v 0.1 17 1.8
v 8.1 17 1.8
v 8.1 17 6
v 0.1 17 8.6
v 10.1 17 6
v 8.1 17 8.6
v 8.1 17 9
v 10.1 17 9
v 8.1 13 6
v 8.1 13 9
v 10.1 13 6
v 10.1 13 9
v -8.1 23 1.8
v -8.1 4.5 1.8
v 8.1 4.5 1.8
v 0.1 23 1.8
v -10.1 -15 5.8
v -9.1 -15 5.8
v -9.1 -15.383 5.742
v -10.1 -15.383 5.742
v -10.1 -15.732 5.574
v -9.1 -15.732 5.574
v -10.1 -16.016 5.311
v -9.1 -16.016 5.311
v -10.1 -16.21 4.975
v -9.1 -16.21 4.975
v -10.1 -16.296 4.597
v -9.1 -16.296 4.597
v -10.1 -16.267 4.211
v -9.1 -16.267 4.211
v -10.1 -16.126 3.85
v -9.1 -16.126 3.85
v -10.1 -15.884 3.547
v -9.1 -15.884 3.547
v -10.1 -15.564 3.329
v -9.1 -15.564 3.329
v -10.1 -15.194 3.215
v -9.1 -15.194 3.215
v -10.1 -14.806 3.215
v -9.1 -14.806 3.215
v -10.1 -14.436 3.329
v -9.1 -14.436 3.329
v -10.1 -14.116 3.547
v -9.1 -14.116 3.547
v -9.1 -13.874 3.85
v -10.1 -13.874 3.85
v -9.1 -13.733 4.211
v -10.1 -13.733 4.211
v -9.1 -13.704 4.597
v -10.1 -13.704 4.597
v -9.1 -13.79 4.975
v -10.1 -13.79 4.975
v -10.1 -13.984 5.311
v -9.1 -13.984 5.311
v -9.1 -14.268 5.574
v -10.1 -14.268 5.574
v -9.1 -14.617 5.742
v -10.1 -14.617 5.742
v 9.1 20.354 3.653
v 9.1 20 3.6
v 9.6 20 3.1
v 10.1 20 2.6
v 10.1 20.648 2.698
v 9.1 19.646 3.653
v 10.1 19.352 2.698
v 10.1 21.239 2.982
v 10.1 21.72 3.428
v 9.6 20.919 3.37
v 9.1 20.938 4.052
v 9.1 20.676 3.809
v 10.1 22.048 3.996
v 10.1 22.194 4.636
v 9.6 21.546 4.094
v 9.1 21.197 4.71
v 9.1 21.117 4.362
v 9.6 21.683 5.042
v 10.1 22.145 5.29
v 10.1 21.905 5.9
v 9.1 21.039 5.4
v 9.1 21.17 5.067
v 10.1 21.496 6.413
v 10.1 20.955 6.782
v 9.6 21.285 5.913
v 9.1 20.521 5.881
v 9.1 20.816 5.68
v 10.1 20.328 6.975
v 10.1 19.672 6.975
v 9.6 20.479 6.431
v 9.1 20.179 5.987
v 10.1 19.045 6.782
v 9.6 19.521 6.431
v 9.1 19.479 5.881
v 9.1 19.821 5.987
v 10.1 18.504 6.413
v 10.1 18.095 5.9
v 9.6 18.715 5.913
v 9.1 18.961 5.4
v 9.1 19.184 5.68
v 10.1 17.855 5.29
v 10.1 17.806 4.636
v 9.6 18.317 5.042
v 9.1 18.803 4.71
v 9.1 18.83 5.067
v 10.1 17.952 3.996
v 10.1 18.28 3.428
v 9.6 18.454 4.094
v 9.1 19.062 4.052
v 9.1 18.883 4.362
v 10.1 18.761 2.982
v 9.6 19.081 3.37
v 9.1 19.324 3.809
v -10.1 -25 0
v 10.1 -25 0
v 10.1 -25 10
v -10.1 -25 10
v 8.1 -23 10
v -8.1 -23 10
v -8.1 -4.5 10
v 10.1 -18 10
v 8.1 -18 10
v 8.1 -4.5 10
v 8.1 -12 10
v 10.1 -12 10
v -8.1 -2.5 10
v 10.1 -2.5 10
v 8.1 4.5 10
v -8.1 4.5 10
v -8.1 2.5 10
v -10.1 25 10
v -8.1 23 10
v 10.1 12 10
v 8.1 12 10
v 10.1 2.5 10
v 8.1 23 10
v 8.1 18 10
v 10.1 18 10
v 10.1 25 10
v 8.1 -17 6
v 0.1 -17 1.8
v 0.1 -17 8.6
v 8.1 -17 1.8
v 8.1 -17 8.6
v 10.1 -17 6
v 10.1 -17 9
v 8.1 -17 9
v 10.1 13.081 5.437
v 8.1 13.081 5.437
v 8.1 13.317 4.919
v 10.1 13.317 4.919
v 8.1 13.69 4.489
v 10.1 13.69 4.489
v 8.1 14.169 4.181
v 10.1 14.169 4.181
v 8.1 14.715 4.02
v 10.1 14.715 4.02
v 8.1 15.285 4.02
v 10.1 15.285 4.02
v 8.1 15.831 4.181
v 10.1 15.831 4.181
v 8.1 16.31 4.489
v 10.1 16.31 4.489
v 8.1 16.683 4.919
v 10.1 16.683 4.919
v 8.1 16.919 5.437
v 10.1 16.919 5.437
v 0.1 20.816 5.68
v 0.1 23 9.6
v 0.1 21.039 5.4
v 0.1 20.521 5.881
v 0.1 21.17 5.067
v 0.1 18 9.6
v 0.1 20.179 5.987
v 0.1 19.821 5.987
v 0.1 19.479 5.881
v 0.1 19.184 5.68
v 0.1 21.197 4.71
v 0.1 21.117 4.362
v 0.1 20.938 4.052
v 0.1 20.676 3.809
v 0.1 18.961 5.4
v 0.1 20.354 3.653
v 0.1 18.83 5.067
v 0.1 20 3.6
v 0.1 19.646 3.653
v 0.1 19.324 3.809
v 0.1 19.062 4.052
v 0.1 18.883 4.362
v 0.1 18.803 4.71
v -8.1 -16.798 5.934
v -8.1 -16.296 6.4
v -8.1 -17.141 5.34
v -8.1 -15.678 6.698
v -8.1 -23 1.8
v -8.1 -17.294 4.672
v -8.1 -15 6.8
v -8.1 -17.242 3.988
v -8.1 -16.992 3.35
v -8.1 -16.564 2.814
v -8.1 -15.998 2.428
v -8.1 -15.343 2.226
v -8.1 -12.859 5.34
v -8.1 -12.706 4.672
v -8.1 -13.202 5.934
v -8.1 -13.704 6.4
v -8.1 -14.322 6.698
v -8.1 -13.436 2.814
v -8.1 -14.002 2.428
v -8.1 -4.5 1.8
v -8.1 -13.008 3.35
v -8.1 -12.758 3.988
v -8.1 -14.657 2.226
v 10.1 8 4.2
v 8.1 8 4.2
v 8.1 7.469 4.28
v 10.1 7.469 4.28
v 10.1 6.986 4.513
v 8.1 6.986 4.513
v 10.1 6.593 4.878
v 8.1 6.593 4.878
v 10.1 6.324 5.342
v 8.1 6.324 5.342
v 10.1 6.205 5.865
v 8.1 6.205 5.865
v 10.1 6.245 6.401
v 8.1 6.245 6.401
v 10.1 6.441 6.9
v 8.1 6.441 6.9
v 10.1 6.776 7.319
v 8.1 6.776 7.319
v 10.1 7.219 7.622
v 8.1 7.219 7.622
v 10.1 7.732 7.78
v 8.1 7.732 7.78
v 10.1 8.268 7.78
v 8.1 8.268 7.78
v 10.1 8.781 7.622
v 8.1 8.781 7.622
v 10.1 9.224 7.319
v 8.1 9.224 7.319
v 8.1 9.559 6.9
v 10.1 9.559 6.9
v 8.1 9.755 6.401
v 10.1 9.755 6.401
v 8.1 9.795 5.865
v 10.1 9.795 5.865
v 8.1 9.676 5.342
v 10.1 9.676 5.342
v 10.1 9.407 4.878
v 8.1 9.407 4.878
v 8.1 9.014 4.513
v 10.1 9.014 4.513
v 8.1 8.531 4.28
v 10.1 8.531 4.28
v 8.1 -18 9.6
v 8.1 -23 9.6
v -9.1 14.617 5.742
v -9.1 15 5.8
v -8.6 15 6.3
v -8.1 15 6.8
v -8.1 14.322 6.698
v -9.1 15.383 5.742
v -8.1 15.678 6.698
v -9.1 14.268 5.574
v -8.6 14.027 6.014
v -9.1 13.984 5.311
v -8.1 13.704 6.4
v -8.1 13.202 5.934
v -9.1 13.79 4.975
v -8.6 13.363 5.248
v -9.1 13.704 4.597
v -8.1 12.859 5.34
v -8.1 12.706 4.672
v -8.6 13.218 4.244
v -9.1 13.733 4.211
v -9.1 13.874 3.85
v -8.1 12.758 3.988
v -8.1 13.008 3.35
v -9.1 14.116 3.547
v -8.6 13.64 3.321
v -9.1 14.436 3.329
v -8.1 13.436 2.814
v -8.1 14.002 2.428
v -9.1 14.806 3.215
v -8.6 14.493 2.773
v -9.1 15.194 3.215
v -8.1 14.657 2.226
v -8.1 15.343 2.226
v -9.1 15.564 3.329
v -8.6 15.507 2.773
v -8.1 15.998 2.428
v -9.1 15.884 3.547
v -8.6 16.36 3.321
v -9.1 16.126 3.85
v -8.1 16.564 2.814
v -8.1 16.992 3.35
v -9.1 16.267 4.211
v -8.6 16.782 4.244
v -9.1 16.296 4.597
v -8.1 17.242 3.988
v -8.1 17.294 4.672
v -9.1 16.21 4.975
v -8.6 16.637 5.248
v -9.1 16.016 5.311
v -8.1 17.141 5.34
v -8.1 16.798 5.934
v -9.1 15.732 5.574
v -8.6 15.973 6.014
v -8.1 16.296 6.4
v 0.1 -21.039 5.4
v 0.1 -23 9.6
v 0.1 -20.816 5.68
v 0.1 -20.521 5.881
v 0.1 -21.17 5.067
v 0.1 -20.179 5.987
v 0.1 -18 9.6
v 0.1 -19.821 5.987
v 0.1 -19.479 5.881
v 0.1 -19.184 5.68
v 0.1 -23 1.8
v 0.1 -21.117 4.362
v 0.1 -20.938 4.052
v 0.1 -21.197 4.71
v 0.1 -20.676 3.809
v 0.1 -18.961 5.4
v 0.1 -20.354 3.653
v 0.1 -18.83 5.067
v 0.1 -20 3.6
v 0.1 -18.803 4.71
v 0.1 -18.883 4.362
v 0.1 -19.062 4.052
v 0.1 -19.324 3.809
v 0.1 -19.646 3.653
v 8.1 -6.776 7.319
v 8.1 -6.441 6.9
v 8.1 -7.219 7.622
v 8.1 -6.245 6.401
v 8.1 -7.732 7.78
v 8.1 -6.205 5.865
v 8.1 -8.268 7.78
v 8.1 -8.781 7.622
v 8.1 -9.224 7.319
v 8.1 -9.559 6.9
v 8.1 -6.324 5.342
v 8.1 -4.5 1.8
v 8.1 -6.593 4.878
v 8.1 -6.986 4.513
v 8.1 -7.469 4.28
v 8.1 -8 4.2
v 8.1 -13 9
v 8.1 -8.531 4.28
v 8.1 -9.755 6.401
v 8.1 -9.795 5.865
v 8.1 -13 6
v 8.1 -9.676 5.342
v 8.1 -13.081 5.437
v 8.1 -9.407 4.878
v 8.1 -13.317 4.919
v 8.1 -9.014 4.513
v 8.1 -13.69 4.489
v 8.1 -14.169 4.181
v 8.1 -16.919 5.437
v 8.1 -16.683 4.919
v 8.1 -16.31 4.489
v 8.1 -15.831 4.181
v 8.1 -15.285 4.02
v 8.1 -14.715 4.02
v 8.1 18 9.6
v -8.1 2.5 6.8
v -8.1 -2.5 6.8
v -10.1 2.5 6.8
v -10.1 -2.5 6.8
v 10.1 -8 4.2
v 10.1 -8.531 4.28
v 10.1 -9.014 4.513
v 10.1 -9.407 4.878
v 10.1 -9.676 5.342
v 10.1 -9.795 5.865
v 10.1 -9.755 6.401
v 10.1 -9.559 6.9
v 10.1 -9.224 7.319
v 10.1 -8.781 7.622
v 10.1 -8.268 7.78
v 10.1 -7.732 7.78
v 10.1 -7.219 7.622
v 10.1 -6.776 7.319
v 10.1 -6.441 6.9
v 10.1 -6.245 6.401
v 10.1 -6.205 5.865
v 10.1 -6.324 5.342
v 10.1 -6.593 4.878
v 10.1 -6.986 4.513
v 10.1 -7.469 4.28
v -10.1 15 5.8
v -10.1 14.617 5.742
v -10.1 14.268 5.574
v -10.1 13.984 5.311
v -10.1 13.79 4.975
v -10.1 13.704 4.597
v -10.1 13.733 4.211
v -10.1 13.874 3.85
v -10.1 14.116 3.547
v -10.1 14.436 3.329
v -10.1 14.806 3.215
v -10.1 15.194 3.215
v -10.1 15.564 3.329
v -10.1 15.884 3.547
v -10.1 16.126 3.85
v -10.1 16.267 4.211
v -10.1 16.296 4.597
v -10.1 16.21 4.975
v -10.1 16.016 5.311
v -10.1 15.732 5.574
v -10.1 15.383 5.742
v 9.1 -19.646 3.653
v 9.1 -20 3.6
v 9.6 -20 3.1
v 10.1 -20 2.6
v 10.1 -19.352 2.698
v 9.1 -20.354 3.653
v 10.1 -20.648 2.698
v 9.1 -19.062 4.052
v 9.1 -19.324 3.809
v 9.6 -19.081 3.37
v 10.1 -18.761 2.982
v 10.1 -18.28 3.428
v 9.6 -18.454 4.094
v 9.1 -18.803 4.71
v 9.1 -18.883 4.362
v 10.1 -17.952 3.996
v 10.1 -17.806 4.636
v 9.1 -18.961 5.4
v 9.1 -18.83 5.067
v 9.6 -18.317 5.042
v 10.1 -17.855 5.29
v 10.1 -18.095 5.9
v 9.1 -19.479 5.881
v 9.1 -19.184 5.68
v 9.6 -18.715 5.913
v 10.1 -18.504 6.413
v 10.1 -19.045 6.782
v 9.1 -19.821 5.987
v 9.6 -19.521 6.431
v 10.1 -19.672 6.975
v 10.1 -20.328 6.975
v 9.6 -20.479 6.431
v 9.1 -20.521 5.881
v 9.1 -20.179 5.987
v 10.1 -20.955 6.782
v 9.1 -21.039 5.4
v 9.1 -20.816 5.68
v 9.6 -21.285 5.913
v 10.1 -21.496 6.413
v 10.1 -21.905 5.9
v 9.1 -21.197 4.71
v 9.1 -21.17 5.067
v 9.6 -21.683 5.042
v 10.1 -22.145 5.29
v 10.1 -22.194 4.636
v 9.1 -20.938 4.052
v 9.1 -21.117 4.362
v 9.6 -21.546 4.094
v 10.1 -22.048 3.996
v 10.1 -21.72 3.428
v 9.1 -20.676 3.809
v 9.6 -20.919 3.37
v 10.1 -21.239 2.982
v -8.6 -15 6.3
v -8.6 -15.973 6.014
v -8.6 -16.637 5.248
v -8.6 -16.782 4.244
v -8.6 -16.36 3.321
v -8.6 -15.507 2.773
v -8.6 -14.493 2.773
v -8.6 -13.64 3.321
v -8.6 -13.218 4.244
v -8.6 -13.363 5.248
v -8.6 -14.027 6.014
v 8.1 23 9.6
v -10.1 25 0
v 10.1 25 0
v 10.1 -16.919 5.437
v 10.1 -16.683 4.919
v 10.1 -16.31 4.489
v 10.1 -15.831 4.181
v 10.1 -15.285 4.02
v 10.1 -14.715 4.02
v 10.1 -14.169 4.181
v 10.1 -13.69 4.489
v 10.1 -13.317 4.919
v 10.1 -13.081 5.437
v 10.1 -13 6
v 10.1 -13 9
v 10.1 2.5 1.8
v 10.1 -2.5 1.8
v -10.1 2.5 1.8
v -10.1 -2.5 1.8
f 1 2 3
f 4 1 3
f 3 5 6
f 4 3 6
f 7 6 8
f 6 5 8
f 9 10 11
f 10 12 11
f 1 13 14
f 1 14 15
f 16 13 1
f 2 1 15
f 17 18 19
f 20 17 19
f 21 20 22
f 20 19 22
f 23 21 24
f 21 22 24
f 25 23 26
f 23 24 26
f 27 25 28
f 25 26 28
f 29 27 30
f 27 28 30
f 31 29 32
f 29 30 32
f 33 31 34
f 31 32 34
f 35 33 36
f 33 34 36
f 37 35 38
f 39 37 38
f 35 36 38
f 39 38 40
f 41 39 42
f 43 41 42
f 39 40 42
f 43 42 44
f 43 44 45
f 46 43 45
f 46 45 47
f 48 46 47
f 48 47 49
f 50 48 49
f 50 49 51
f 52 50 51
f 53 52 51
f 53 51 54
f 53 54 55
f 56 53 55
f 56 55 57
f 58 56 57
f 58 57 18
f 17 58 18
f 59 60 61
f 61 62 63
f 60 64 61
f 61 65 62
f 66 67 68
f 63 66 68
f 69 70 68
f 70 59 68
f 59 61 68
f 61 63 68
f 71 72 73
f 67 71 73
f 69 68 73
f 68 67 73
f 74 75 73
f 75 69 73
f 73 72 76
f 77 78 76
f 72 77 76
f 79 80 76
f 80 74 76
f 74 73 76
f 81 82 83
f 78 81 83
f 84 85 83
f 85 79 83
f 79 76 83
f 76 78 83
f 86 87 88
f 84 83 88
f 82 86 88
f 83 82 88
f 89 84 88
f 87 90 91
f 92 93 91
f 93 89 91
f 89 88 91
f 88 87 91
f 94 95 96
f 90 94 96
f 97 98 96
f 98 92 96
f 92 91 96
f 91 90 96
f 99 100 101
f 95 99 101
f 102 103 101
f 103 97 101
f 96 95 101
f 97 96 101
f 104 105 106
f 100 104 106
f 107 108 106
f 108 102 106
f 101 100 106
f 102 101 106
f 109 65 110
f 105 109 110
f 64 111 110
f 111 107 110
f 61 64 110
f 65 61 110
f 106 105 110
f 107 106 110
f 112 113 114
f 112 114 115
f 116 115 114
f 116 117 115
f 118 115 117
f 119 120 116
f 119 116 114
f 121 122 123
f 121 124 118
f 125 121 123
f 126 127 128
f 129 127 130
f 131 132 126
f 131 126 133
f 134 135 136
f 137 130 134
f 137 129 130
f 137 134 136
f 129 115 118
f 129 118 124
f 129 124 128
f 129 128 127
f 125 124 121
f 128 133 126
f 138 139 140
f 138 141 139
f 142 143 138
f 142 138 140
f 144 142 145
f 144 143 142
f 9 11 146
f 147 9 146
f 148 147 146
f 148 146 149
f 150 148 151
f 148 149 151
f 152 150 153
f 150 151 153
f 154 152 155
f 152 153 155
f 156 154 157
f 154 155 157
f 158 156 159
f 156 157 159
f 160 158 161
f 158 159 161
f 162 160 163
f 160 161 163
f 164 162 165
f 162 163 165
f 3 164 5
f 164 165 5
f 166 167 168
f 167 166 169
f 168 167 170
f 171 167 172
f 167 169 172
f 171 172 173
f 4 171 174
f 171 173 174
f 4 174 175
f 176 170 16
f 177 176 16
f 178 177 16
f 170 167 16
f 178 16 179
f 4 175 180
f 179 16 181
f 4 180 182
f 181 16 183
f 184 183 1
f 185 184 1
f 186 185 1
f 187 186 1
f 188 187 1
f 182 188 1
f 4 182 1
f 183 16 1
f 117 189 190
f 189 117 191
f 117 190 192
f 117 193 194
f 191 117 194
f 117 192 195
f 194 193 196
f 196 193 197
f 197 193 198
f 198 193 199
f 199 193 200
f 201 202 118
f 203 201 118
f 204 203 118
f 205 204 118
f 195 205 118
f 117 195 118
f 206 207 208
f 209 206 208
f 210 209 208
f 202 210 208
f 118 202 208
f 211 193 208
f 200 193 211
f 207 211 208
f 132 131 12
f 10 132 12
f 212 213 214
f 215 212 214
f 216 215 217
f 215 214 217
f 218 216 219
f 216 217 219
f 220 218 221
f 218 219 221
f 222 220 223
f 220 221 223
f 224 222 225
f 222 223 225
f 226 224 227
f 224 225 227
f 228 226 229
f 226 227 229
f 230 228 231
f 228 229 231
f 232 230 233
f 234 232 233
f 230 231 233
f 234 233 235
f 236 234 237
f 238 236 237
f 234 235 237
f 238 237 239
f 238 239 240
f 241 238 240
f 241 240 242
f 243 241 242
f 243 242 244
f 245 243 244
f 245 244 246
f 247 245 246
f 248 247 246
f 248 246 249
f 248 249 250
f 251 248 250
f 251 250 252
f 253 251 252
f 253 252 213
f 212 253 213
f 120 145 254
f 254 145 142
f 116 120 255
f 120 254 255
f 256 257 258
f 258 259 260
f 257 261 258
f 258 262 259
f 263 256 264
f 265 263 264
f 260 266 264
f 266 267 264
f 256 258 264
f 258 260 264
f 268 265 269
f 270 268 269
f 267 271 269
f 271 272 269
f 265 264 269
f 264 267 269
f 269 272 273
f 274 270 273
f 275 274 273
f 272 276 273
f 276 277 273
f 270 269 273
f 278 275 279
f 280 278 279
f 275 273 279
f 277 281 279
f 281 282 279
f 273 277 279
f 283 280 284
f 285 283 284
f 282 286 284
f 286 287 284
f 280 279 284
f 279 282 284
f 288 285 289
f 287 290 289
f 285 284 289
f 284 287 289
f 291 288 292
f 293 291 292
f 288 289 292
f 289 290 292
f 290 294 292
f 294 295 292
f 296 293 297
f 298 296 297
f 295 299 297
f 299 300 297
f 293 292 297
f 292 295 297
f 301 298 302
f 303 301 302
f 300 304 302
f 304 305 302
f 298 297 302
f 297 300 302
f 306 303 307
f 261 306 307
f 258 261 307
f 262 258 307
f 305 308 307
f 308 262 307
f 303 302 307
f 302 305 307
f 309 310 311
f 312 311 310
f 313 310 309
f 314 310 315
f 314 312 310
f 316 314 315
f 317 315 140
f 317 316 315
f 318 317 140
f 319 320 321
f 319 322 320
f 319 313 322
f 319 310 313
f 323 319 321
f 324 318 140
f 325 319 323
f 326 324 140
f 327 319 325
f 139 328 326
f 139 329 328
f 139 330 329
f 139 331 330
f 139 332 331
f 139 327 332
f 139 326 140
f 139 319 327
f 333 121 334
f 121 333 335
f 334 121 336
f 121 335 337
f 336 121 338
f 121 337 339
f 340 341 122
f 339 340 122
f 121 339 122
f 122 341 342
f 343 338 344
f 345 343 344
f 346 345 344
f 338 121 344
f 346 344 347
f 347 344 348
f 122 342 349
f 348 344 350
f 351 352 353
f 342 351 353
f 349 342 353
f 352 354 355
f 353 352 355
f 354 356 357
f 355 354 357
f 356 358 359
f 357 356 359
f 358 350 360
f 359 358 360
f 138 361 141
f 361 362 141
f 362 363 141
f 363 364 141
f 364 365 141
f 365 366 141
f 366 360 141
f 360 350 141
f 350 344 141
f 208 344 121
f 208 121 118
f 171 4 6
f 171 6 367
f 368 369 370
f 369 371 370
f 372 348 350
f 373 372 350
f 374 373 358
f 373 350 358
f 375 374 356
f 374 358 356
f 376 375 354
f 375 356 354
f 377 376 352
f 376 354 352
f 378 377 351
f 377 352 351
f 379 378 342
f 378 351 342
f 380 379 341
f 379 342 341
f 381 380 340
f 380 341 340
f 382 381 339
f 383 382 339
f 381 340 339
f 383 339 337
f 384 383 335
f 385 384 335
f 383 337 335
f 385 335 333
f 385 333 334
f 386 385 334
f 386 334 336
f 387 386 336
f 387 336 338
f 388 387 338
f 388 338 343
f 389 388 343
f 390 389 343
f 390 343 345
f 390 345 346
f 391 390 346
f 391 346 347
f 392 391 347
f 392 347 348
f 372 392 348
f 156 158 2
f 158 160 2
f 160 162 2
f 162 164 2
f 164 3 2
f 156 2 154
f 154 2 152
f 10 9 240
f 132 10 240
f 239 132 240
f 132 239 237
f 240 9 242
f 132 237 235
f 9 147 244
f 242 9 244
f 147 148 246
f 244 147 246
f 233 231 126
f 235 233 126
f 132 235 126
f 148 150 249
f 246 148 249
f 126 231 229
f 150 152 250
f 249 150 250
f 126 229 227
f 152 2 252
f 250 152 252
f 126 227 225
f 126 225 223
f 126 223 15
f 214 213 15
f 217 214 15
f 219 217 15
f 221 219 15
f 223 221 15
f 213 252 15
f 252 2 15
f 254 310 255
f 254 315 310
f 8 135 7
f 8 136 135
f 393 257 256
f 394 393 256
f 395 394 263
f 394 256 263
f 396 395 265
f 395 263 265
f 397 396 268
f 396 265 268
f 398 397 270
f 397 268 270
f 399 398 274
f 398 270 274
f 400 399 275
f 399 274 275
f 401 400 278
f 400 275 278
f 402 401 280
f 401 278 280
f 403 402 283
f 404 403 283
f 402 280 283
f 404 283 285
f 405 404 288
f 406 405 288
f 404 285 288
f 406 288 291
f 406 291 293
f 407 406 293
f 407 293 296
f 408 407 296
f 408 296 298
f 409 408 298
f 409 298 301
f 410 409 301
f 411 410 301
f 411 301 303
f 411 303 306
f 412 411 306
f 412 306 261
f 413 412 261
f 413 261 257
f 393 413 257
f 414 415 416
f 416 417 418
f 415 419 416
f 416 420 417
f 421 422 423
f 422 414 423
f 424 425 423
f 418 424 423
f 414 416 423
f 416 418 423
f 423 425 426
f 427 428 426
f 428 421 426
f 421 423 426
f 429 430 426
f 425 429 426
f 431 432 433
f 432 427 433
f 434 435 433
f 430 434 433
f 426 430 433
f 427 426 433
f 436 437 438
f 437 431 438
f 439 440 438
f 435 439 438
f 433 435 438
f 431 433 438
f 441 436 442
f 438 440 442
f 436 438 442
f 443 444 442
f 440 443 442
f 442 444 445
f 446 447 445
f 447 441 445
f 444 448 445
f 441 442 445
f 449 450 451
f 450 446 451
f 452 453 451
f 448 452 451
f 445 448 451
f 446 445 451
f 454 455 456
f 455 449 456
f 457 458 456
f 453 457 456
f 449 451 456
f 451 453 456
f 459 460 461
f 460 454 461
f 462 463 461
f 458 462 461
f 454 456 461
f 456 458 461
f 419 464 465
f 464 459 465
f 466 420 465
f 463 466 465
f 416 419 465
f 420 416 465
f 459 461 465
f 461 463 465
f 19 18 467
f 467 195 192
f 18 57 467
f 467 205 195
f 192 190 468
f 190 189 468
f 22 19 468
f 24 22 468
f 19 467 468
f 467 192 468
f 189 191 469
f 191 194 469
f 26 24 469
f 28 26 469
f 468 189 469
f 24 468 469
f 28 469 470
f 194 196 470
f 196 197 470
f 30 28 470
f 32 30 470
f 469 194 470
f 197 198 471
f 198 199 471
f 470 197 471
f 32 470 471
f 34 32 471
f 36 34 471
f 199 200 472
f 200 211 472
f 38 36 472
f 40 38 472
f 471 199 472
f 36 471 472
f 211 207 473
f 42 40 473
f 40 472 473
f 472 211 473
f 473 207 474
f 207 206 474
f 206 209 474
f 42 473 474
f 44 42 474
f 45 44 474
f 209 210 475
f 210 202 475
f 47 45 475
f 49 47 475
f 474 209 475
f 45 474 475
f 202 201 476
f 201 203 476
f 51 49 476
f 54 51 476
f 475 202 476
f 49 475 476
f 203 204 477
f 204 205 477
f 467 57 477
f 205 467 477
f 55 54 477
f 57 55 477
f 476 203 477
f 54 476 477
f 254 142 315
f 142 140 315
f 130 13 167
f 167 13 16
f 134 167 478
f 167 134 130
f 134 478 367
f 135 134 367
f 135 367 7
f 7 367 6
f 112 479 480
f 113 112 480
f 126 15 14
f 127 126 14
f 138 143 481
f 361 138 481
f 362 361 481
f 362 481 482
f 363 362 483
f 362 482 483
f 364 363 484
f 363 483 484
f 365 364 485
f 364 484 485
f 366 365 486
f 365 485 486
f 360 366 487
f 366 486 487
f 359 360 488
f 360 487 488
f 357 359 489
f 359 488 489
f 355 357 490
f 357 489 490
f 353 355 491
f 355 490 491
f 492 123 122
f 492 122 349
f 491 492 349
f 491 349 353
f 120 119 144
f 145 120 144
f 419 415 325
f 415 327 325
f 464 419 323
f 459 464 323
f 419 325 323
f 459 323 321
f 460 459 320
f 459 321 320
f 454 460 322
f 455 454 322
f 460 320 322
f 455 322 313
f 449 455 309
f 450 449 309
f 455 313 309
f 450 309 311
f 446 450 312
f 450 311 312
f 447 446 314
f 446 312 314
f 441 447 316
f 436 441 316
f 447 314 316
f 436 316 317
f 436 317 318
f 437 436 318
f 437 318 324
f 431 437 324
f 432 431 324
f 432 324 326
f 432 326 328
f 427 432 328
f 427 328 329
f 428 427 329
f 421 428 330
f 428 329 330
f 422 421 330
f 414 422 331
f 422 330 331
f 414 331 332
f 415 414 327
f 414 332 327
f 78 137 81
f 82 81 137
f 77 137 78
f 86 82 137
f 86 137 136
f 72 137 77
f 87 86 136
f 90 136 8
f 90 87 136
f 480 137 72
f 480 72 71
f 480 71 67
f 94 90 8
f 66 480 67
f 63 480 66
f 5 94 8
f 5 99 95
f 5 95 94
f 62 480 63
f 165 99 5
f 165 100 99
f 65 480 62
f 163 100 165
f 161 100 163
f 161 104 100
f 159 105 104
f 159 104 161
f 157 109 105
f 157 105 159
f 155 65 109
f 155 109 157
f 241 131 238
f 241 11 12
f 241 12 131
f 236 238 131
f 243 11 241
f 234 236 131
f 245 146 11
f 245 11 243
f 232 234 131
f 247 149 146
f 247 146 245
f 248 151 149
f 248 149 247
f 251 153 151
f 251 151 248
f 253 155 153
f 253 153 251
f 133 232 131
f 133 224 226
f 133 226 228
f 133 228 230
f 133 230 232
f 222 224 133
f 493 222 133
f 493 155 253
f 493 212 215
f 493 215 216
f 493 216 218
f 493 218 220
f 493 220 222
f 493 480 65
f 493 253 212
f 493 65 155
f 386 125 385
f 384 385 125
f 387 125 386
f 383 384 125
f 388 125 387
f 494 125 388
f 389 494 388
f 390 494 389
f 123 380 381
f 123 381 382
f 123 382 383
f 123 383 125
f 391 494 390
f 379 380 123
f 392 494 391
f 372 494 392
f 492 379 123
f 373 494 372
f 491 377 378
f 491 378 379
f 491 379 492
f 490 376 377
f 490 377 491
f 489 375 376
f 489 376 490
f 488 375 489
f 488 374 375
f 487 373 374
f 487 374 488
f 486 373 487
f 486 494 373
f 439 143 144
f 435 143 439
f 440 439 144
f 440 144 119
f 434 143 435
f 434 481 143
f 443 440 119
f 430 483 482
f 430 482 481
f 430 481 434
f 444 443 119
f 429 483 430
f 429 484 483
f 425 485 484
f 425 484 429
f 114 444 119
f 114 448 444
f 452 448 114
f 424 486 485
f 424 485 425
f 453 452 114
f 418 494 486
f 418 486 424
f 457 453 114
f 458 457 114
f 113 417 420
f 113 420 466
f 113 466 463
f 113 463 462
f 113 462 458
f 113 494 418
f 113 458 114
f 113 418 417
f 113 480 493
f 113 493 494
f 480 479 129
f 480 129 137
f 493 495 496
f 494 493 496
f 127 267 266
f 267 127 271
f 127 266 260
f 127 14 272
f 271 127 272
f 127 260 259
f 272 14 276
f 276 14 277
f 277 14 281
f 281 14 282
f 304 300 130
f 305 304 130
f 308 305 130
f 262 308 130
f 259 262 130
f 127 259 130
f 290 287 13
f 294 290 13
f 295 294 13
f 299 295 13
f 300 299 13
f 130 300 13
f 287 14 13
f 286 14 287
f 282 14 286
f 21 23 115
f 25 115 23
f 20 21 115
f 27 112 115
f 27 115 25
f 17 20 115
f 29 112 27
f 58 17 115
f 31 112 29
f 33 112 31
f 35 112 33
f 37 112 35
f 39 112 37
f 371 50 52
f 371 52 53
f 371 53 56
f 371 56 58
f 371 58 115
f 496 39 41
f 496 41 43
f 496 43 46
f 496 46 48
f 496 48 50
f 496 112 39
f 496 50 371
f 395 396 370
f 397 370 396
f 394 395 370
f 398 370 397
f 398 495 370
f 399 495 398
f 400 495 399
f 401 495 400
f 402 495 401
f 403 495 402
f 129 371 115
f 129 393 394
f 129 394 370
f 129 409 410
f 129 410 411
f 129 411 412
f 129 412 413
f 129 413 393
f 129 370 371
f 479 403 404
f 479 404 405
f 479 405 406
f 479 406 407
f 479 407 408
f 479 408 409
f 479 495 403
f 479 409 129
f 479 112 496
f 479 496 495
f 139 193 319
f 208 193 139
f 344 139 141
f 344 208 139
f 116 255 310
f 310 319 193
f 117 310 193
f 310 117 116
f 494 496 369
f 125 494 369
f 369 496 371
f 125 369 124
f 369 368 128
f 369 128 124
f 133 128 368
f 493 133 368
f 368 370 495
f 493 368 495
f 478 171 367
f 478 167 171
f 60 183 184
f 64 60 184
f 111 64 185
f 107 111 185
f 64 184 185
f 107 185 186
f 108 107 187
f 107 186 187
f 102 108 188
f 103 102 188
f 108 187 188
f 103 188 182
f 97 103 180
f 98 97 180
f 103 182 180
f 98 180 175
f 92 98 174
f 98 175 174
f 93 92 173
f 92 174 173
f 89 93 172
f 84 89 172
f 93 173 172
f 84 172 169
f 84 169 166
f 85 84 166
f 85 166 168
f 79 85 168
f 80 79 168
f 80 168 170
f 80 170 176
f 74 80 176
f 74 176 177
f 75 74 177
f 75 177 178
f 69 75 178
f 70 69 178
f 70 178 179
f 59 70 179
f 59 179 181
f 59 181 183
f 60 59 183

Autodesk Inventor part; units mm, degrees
ref_plane "YZ Plane" through (0, 0, 0) normal (1, 0, 0) x (0, 1, 0)
ref_plane "XZ Plane" through (0, 0, 0) normal (0, 1, 0) x (-1, 0, 0)
ref_plane "XY Plane" through (0, 0, 0) normal (0, 0, 1) x (1, 0, 0)
sketch "Sketch3" plane through (0, 0, 0) normal (0, 0, 1) x (1, 0, 0)
  line L0 (-10.1, 25) -> (10.1, 25)
  line L1 (10.1, 25) -> (10.1, -25)
  line L2 (10.1, -25) -> (-10.1, -25)
  line L3 (-10.1, -25) -> (-10.1, 25)
  point P0 (0, 0)
  dimension "d26" = 20.2
  dimension "d27" = 50
extrude "Extrusion3" add sketch "Sketch3" along normal blind 1.8
sketch "Sketch4" plane through (0, 0, 1.8) normal (0, 0, 1) x (1, 0, 0)
  line L0 (-8.1, 23) -> (8.1, 23)
  line L1 (8.1, -23) -> (-8.1, -23)
  line L2 (-8.1, 0) -> (-8.1, 2.5)
  line L3 (-8.1, 2.5) -> (8.1, 2.5)
  line L4 (8.1, 4.5) -> (-8.1, 4.5)
  line L5 (-8.1, 0) -> (-8.1, -2.5)
  line L6 (-8.1, -2.5) -> (8.1, -2.5)
  line L7 (8.1, -4.5) -> (-8.1, -4.5)
  line L8 (-8.1, 4.5) -> (-8.1, 23)
  line L9 (8.1, 23) -> (8.1, 4.5)
  line L10 (8.1, 2.5) -> (8.1, -2.5)
  line L11 (8.1, -4.5) -> (8.1, -23)
  line L12 (-10.1, 25) -> (-10.1, -25) projected
  line L13 (10.1, -25) -> (10.1, 25) projected
  line L14 (-10.1, 25) -> (10.1, 25)
  line L15 (10.1, 25) -> (10.1, -25)
  line L16 (10.1, -25) -> (-10.1, -25)
  line L17 (-10.1, -25) -> (-10.1, 25)
  line L18 (-8.1, -23) -> (-8.1, -4.5)
  line L19 (-8.1, -2.5) -> (-8.1, 2.5)
  point P0 (0, 0)
  dimension "d39" = 2.5
  dimension "d40" = 2.5
  dimension "d44" = 2
  dimension "d45" = 2
  dimension "d48" = 2
  dimension "d49" = 2
  dimension "d50" = 2
  dimension "d51" = 2
  dimension "d52" = 2
  dimension "d53" = 2
  dimension "d56" = 2
  dimension "d57" = 2
extrude "Extrusion4" add sketch "Sketch4" along normal blind 8.2
sketch "Sketch5" plane through (10.1, -25, 0) normal (1, 0, 0) x (0, 0, -1)
  line L0 (-1.8, 27.5) -> (-10, 27.5) projected
  line L1 (-1.8, 22.5) -> (-10, 22.5) projected
  line L2 (-10, 27.5) -> (-1.8, 27.5)
  line L3 (-1.8, 27.5) -> (-1.8, 22.5)
  line L4 (-1.8, 22.5) -> (-10, 22.5)
  line L5 (-10, 22.5) -> (-10, 27.5)
  point P0 (0, 25)
extrude "Extrusion5" cut sketch "Sketch5" against normal blind 8.2
sketch "Sketch6" plane through (-10.1, -25, 0) normal (-1, 0, 0) x (0, 0, 1)
  line L0 (1.8, 27.5) -> (1.8, 22.5) projected
  line L1 (1.8, 22.5) -> (6.8, 22.5)
  line L2 (6.8, 22.5) -> (6.8, 27.5)
  line L3 (6.8, 27.5) -> (1.8, 27.5)
  line L4 (1.8, 27.5) -> (1.8, 22.5)
  point P0 (0, 25)
  dimension "d60" = 5
  dimension "d61" = 5
extrude "Extrusion6" cut sketch "Sketch6" against normal blind 8.2
sketch "Sketch10" plane through (-10.1, -25, 0) normal (-1, 0, 0) x (0, 0, 1)
  line L0 (0, 0) -> (0, 50) projected
  line L1 (0, 0) -> (10, 0) projected
  point P0 (0, 25)
  point P1 (4.5, 10)
  point P2 (4.5, 40)
hole "Hole6" at (-10.1, -15, 4.5) at (-10.1, 15, 4.5) direction (1, 0, 0) diameter 2.6 depth 2 tip angle 118
sketch "Sketch11" plane through (0, 0, 1.8) normal (0, 0, 1) x (1, 0, 0)
  line L0 (8.1, -23) -> (8.1, -4.5) projected
  line L1 (8.1, -23) -> (0.1, -23)
  line L2 (0.1, -23) -> (0.1, -17)
  line L3 (0.1, -17) -> (8.1, -17)
  line L4 (8.1, -17) -> (8.1, -23)
  line L5 (10.1, 25) -> (10.1, -25) projected
  line L6 (8.1, 23) -> (0.1, 23)
  line L7 (0.1, 23) -> (0.1, 17)
  line L8 (0.1, 17) -> (8.1, 17)
  line L9 (8.1, 17) -> (8.1, 23)
  point P0 (0, 0)
  dimension "d143" = 8
  dimension "d144" = 6
extrude "Extrusion9" add sketch "Sketch11" along normal blind 7.8
sketch "Sketch12" plane through (10.1, -25, 0) normal (1, 0, 0) x (0, 0, -1)
  line L0 (0, 50) -> (0, 0) projected
  line L1 (0, 0) -> (-10, 0) projected
  circle A0 centre (-6, 10) radius 2
  line L2 (-1.8, 8) -> (-9.6, 8) projected
  line L3 (-10, 20.5) -> (-10, 2) projected
  line L4 (-6, 8) -> (-10, 8)
  line L5 (-10, 8) -> (-10, 12)
  line L6 (-10, 12) -> (-6, 12)
  line L7 (-6, 12) -> (-6, 8)
  line L8 (0, 25) -> (-4.8, 25)
  circle A1 centre (-6, 40) radius 2
  line L9 (-1.8, 42) -> (-9.6, 42)
  line L10 (-6, 42) -> (-10, 42)
  line L11 (-10, 42) -> (-10, 38)
  line L12 (-10, 38) -> (-6, 38)
  line L13 (-6, 38) -> (-6, 42)
  point P0 (-4.8, 5)
  point P1 (-6, 17)
  point P2 (-4.8, 45)
  point P3 (-6, 33)
  dimension "d153" = 4
hole "Hole7" at (10.1, -20, 4.8) at (10.1, 20, 4.8) direction (-1, 0, 0) diameter 2.4 depth 10 tip angle 118
hole "Hole8" at (10.1, -8, 6) at (10.1, 8, 6) direction (-1, 0, 0) diameter 3.6 depth 2 tip angle 118
extrude "Extrusion10" cut sketch "Sketch12" against normal blind 2
chamfer "Chamfer4" distance 1 angle 45 10 edges at (10.1, -20, 6) (-8.1, -15, 3.2) (10.1, 20, 6) (-8.1, 15, 3.2) (4.1, -17, 9.6) (4.1, 17, 9.6) (9.1, -17, 10) (9.1, 17, 10) (9.1, 13, 10) (9.1, -13, 10)
properties part number "digit_holder_A_no_hole"
